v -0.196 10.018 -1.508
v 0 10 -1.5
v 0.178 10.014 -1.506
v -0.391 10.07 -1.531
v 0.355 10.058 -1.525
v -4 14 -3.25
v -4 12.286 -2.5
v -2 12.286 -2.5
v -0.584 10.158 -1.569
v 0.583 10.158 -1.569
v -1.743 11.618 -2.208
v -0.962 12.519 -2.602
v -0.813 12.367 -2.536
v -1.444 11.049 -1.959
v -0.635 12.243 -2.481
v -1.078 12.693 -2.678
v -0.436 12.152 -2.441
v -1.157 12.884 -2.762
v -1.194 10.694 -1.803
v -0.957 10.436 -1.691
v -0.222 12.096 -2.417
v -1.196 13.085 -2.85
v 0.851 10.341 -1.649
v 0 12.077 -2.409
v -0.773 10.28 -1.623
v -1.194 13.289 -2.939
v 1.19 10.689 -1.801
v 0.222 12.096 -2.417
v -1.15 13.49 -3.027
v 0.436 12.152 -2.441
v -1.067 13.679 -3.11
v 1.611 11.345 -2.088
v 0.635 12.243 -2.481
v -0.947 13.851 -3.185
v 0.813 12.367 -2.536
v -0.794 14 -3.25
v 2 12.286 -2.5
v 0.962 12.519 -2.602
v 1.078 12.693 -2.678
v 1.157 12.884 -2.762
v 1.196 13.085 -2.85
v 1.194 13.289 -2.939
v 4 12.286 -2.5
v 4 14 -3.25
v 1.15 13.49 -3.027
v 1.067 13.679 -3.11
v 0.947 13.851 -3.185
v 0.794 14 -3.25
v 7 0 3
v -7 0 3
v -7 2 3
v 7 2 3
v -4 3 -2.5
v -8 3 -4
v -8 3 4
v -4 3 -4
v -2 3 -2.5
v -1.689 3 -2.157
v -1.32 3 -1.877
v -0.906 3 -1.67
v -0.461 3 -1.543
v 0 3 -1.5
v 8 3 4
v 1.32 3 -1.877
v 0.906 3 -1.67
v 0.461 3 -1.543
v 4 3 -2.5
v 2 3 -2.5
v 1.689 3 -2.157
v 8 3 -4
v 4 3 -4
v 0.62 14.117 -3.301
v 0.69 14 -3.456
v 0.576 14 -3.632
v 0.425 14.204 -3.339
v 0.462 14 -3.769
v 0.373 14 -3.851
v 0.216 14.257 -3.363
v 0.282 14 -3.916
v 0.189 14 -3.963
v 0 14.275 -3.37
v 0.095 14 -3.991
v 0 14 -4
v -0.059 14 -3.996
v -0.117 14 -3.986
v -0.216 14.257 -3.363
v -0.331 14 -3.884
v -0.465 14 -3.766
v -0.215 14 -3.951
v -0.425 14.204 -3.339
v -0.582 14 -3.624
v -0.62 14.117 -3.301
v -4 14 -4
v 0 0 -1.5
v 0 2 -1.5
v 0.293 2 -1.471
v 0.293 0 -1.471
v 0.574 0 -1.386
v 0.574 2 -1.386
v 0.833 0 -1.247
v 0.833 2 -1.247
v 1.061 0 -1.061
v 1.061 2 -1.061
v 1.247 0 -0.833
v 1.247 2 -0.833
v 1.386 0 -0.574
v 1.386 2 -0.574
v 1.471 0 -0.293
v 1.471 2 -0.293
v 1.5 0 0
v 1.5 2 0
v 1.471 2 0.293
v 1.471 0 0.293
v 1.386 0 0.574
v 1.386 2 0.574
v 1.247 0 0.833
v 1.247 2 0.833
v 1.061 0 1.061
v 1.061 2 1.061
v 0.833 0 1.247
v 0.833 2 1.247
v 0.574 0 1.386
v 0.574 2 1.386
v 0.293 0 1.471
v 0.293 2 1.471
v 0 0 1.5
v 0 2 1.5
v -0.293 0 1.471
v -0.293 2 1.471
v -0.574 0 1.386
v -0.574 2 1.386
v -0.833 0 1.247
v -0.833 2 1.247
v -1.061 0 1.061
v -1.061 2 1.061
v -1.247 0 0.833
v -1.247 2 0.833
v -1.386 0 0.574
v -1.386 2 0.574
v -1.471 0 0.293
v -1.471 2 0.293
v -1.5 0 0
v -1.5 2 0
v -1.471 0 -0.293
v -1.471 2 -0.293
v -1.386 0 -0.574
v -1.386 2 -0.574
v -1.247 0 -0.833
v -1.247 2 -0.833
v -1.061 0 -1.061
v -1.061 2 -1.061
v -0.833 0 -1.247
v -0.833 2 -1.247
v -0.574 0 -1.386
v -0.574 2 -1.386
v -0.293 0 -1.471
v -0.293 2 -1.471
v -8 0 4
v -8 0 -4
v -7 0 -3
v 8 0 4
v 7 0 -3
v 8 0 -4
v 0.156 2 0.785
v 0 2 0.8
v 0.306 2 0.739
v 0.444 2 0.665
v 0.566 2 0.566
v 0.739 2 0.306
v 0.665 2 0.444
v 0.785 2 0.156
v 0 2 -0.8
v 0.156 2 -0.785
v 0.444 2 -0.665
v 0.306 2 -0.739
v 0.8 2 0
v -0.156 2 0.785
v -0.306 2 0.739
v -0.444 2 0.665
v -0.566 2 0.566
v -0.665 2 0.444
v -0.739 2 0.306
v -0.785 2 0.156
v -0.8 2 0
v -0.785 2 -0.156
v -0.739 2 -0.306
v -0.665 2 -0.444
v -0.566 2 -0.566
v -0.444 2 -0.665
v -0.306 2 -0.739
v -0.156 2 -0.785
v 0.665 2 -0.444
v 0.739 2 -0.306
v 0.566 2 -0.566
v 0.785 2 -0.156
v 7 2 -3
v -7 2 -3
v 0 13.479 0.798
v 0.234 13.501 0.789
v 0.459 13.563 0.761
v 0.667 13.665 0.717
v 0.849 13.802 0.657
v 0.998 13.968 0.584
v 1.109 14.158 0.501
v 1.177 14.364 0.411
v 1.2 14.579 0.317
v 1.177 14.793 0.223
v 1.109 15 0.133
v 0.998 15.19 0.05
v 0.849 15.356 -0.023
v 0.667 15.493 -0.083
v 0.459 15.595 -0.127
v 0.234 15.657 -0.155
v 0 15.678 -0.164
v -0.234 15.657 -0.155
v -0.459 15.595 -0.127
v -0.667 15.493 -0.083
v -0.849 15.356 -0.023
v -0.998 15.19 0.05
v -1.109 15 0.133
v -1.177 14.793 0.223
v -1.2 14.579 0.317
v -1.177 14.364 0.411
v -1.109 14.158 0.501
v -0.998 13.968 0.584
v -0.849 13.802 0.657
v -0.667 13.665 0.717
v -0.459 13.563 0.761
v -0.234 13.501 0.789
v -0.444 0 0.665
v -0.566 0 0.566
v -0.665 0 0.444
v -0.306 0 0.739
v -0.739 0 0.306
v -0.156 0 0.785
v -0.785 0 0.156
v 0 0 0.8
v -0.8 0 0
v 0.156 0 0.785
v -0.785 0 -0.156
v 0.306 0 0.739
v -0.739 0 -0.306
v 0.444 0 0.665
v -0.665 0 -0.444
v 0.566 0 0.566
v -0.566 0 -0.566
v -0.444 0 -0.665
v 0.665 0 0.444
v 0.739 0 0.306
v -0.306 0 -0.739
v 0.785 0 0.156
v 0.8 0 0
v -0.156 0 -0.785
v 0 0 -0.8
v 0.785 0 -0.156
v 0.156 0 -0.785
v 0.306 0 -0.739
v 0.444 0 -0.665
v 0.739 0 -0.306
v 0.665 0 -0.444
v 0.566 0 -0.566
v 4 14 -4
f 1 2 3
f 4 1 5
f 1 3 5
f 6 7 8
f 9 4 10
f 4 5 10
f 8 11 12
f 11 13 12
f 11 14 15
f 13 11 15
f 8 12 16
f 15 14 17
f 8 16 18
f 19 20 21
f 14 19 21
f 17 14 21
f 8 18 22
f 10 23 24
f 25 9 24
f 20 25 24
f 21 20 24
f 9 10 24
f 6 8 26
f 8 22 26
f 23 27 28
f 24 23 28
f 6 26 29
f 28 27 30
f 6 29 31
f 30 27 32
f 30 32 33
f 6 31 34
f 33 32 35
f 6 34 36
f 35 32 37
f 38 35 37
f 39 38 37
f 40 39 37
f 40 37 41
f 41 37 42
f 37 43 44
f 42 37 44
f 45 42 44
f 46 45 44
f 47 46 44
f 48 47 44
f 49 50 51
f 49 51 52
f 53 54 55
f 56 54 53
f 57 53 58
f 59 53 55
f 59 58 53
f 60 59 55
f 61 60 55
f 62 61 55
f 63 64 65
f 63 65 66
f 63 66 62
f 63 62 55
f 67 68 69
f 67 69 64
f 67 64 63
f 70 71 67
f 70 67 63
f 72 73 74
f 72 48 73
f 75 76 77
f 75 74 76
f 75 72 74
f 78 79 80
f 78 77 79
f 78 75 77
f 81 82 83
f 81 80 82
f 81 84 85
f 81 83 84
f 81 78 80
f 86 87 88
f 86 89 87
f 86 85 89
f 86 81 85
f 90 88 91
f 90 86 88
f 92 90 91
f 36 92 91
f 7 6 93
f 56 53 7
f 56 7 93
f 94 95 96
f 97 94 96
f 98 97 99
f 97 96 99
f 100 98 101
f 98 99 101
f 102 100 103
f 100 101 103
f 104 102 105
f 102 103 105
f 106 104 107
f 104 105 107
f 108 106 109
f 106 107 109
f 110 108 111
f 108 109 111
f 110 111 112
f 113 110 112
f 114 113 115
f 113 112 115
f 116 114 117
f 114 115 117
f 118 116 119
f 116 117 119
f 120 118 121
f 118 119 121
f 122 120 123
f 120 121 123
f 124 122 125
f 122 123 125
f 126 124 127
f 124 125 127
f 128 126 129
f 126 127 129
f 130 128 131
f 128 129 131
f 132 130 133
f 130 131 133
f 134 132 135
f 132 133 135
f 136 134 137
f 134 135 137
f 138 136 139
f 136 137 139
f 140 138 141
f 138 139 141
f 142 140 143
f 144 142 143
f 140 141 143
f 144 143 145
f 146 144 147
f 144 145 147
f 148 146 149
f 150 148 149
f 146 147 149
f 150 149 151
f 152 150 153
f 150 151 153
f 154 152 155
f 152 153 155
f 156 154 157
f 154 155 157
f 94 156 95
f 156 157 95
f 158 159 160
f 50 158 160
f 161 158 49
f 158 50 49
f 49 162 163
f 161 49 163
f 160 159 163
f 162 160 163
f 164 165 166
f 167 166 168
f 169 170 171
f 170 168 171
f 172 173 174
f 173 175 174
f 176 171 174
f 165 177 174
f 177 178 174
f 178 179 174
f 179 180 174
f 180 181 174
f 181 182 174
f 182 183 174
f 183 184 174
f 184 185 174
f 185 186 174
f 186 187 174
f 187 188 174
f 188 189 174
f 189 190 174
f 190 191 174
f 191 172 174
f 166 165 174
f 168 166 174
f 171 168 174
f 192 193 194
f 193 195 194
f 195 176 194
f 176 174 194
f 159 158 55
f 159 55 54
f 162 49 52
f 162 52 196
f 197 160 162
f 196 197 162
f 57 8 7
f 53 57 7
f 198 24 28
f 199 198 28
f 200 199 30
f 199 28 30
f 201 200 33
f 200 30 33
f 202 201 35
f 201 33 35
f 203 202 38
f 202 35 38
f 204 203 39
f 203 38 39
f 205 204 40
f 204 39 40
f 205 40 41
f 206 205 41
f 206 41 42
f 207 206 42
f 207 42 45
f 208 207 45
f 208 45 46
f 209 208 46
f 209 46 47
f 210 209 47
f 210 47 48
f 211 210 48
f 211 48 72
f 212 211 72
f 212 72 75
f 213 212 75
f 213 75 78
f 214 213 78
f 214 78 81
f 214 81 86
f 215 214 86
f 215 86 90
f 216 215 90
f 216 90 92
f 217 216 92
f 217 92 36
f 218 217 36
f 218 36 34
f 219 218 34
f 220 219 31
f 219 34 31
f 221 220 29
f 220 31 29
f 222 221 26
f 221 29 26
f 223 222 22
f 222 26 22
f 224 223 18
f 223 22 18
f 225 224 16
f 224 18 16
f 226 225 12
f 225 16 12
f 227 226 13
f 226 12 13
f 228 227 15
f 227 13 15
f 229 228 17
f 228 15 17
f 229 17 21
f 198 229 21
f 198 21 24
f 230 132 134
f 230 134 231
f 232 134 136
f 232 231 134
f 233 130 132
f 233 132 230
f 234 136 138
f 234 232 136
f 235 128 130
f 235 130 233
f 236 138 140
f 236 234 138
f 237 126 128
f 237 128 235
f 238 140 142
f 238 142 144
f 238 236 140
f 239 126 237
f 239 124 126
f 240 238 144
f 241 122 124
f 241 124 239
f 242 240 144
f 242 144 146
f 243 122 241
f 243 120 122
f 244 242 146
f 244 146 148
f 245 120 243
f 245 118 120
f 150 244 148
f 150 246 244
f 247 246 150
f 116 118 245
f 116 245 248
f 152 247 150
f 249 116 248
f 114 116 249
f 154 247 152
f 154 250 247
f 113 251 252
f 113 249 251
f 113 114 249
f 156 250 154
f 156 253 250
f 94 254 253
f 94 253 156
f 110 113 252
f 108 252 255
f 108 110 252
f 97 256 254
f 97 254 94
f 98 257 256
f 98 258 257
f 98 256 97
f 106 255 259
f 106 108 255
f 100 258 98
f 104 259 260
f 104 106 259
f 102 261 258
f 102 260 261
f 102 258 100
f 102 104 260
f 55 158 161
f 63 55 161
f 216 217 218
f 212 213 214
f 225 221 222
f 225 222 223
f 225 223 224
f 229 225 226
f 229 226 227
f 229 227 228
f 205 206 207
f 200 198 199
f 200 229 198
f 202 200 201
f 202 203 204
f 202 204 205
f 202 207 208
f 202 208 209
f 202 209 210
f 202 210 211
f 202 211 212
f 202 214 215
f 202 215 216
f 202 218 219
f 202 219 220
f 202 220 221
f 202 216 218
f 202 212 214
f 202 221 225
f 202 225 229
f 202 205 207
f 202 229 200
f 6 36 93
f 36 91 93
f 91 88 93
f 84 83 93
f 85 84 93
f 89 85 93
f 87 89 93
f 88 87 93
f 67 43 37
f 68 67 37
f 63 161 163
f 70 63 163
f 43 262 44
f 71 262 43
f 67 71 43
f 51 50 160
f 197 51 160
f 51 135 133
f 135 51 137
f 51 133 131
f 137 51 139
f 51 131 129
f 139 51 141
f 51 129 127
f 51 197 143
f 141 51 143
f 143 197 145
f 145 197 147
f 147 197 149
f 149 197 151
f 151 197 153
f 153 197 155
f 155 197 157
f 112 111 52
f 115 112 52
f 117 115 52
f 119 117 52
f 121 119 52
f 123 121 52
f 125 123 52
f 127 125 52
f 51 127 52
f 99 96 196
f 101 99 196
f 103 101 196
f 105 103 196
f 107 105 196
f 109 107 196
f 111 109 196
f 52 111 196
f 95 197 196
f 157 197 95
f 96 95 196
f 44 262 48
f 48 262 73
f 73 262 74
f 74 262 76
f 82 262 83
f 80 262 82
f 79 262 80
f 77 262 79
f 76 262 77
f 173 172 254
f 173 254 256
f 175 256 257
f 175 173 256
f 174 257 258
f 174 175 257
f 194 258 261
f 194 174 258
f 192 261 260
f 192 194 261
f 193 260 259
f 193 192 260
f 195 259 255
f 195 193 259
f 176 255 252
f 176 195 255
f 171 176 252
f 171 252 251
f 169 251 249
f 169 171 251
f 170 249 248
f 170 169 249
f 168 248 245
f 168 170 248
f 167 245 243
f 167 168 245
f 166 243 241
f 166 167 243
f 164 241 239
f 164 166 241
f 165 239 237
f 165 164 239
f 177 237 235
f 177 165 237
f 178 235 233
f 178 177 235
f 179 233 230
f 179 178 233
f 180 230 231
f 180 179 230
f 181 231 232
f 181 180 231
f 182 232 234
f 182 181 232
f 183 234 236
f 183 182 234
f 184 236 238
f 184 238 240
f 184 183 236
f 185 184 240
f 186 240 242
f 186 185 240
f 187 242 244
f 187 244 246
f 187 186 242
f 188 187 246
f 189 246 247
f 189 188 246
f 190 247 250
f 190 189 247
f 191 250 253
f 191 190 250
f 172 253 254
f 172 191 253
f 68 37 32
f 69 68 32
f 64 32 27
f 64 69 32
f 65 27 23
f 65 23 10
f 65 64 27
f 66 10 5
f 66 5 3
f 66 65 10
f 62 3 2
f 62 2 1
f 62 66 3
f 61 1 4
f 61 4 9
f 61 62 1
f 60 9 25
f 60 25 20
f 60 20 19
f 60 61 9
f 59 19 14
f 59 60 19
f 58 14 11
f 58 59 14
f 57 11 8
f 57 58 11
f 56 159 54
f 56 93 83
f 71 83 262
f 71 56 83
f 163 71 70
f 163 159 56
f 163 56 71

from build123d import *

# Parameters (mm, degrees)
SKETCH1_W                       = 16
SKETCH1_H                       = 8
BOSS_EXTRUDE1_DEPTH             = 3
SHELL1_T                        = -1
SKETCH3_R                       = 1.5
SKETCH3_R_2                     = 0.8
BOSS_EXTRUDE2_DEPTH             = 2
BOSS_EXTRUDE3_DEPTH             = 11
CUT_EXTRUDE1_REACH              = 20.868
SKETCH6_R                       = 1.2
BOSS_EXTRUDE5_DEPTH             = 3.5
BOSS_EXTRUDE5_DIRECTION_2_REACH = 18.513


with BuildPart() as part:
    # Sketch1 → Boss-Extrude1 (new body)
    with BuildSketch(Plane(origin=(0, 0, 0), x_dir=(1, 0, 0), z_dir=(0, 1, 0))):
        Rectangle(SKETCH1_W, SKETCH1_H)
    extrude(amount=BOSS_EXTRUDE1_DEPTH)

    # Shell1
    shell1_openings = [part.faces().sort_by_distance(p)[0] for p in [
        (0, 0, 0),
    ]]
    offset(amount=SHELL1_T, openings=shell1_openings, kind=Kind.INTERSECTION)

    # Sketch3 → Boss-Extrude2 (add)
    with BuildSketch(Plane.XZ.offset(-2)):
        with Locations(Location((0, 0, 0), (0, 0, 270))):
            Circle(SKETCH3_R)
        with Locations(Location((0, 0, 0), (0, 0, 270))):
            Circle(SKETCH3_R_2, mode=Mode.SUBTRACT)
    extrude(amount=BOSS_EXTRUDE2_DEPTH)

    # Sketch4 → Boss-Extrude3 (add)
    with BuildSketch(Plane(origin=(0, 3, 0), x_dir=(1, 0, 0), z_dir=(0, 1, 0))):
        with BuildLine():
            Line((-4, 4), (4, 4))
            Line((4, 4), (4, 2.5))
            Line((4, 2.5), (2, 2.5))
            ThreePointArc((2, 2.5), (0, 1.5), (-2, 2.5))
            Line((-2, 2.5), (-4, 2.5))
            Line((-4, 2.5), (-4, 4))
        make_face()
    extrude(amount=BOSS_EXTRUDE3_DEPTH)

    # Sketch5 → Cut-Extrude1 (cut, up to next)
    with BuildSketch(Plane(origin=(4, 0, 0), x_dir=(0, 0, -1), z_dir=(1, 0, 0)), mode=Mode.PRIVATE) as cut_extrude1_sk1:
        Polygon((3.25, 14), (1.5, 14), (1.5, 10), align=None)
    cut_extrude1_tool1 = extrude(cut_extrude1_sk1.sketch, amount=-CUT_EXTRUDE1_REACH, mode=Mode.PRIVATE) & part.part
    add(cut_extrude1_tool1.solids().sort_by_distance((4, 12.666667, -2.083333))[0], mode=Mode.SUBTRACT)

    # Sketch6 → Boss-Extrude5 (add)
    with BuildSketch(Plane(origin=(0, 1.055737705, 2.413114754), x_dir=(1, 0, 0), z_dir=(0, 0.400818834019708, 0.9161573349021891))):
        with Locations(Location((0, 13.229478025, 0), (0, 0, 270))):
            Circle(SKETCH6_R)
    extrude(amount=BOSS_EXTRUDE5_DEPTH)

    # Sketch6 → Boss-Extrude5 direction 2 (add, up to next)
    with BuildSketch(Plane(origin=(0, 1.055737705, 2.413114754), x_dir=(1, 0, 0), z_dir=(0, 0.400818834019708, 0.9161573349021891)), mode=Mode.PRIVATE) as boss_extrude5_direction_2_sk1:
        with Locations(Location((0, 13.229478025, 0), (0, 0, 270))):
            Circle(SKETCH6_R)
    boss_extrude5_direction_2_tool1 = extrude(boss_extrude5_direction_2_sk1.sketch, amount=-BOSS_EXTRUDE5_DIRECTION_2_REACH, mode=Mode.PRIVATE) - part.part
    add(boss_extrude5_direction_2_tool1.solids().sort_by_distance((0, 13.176021, -2.889509))[0])


solid = part.part
